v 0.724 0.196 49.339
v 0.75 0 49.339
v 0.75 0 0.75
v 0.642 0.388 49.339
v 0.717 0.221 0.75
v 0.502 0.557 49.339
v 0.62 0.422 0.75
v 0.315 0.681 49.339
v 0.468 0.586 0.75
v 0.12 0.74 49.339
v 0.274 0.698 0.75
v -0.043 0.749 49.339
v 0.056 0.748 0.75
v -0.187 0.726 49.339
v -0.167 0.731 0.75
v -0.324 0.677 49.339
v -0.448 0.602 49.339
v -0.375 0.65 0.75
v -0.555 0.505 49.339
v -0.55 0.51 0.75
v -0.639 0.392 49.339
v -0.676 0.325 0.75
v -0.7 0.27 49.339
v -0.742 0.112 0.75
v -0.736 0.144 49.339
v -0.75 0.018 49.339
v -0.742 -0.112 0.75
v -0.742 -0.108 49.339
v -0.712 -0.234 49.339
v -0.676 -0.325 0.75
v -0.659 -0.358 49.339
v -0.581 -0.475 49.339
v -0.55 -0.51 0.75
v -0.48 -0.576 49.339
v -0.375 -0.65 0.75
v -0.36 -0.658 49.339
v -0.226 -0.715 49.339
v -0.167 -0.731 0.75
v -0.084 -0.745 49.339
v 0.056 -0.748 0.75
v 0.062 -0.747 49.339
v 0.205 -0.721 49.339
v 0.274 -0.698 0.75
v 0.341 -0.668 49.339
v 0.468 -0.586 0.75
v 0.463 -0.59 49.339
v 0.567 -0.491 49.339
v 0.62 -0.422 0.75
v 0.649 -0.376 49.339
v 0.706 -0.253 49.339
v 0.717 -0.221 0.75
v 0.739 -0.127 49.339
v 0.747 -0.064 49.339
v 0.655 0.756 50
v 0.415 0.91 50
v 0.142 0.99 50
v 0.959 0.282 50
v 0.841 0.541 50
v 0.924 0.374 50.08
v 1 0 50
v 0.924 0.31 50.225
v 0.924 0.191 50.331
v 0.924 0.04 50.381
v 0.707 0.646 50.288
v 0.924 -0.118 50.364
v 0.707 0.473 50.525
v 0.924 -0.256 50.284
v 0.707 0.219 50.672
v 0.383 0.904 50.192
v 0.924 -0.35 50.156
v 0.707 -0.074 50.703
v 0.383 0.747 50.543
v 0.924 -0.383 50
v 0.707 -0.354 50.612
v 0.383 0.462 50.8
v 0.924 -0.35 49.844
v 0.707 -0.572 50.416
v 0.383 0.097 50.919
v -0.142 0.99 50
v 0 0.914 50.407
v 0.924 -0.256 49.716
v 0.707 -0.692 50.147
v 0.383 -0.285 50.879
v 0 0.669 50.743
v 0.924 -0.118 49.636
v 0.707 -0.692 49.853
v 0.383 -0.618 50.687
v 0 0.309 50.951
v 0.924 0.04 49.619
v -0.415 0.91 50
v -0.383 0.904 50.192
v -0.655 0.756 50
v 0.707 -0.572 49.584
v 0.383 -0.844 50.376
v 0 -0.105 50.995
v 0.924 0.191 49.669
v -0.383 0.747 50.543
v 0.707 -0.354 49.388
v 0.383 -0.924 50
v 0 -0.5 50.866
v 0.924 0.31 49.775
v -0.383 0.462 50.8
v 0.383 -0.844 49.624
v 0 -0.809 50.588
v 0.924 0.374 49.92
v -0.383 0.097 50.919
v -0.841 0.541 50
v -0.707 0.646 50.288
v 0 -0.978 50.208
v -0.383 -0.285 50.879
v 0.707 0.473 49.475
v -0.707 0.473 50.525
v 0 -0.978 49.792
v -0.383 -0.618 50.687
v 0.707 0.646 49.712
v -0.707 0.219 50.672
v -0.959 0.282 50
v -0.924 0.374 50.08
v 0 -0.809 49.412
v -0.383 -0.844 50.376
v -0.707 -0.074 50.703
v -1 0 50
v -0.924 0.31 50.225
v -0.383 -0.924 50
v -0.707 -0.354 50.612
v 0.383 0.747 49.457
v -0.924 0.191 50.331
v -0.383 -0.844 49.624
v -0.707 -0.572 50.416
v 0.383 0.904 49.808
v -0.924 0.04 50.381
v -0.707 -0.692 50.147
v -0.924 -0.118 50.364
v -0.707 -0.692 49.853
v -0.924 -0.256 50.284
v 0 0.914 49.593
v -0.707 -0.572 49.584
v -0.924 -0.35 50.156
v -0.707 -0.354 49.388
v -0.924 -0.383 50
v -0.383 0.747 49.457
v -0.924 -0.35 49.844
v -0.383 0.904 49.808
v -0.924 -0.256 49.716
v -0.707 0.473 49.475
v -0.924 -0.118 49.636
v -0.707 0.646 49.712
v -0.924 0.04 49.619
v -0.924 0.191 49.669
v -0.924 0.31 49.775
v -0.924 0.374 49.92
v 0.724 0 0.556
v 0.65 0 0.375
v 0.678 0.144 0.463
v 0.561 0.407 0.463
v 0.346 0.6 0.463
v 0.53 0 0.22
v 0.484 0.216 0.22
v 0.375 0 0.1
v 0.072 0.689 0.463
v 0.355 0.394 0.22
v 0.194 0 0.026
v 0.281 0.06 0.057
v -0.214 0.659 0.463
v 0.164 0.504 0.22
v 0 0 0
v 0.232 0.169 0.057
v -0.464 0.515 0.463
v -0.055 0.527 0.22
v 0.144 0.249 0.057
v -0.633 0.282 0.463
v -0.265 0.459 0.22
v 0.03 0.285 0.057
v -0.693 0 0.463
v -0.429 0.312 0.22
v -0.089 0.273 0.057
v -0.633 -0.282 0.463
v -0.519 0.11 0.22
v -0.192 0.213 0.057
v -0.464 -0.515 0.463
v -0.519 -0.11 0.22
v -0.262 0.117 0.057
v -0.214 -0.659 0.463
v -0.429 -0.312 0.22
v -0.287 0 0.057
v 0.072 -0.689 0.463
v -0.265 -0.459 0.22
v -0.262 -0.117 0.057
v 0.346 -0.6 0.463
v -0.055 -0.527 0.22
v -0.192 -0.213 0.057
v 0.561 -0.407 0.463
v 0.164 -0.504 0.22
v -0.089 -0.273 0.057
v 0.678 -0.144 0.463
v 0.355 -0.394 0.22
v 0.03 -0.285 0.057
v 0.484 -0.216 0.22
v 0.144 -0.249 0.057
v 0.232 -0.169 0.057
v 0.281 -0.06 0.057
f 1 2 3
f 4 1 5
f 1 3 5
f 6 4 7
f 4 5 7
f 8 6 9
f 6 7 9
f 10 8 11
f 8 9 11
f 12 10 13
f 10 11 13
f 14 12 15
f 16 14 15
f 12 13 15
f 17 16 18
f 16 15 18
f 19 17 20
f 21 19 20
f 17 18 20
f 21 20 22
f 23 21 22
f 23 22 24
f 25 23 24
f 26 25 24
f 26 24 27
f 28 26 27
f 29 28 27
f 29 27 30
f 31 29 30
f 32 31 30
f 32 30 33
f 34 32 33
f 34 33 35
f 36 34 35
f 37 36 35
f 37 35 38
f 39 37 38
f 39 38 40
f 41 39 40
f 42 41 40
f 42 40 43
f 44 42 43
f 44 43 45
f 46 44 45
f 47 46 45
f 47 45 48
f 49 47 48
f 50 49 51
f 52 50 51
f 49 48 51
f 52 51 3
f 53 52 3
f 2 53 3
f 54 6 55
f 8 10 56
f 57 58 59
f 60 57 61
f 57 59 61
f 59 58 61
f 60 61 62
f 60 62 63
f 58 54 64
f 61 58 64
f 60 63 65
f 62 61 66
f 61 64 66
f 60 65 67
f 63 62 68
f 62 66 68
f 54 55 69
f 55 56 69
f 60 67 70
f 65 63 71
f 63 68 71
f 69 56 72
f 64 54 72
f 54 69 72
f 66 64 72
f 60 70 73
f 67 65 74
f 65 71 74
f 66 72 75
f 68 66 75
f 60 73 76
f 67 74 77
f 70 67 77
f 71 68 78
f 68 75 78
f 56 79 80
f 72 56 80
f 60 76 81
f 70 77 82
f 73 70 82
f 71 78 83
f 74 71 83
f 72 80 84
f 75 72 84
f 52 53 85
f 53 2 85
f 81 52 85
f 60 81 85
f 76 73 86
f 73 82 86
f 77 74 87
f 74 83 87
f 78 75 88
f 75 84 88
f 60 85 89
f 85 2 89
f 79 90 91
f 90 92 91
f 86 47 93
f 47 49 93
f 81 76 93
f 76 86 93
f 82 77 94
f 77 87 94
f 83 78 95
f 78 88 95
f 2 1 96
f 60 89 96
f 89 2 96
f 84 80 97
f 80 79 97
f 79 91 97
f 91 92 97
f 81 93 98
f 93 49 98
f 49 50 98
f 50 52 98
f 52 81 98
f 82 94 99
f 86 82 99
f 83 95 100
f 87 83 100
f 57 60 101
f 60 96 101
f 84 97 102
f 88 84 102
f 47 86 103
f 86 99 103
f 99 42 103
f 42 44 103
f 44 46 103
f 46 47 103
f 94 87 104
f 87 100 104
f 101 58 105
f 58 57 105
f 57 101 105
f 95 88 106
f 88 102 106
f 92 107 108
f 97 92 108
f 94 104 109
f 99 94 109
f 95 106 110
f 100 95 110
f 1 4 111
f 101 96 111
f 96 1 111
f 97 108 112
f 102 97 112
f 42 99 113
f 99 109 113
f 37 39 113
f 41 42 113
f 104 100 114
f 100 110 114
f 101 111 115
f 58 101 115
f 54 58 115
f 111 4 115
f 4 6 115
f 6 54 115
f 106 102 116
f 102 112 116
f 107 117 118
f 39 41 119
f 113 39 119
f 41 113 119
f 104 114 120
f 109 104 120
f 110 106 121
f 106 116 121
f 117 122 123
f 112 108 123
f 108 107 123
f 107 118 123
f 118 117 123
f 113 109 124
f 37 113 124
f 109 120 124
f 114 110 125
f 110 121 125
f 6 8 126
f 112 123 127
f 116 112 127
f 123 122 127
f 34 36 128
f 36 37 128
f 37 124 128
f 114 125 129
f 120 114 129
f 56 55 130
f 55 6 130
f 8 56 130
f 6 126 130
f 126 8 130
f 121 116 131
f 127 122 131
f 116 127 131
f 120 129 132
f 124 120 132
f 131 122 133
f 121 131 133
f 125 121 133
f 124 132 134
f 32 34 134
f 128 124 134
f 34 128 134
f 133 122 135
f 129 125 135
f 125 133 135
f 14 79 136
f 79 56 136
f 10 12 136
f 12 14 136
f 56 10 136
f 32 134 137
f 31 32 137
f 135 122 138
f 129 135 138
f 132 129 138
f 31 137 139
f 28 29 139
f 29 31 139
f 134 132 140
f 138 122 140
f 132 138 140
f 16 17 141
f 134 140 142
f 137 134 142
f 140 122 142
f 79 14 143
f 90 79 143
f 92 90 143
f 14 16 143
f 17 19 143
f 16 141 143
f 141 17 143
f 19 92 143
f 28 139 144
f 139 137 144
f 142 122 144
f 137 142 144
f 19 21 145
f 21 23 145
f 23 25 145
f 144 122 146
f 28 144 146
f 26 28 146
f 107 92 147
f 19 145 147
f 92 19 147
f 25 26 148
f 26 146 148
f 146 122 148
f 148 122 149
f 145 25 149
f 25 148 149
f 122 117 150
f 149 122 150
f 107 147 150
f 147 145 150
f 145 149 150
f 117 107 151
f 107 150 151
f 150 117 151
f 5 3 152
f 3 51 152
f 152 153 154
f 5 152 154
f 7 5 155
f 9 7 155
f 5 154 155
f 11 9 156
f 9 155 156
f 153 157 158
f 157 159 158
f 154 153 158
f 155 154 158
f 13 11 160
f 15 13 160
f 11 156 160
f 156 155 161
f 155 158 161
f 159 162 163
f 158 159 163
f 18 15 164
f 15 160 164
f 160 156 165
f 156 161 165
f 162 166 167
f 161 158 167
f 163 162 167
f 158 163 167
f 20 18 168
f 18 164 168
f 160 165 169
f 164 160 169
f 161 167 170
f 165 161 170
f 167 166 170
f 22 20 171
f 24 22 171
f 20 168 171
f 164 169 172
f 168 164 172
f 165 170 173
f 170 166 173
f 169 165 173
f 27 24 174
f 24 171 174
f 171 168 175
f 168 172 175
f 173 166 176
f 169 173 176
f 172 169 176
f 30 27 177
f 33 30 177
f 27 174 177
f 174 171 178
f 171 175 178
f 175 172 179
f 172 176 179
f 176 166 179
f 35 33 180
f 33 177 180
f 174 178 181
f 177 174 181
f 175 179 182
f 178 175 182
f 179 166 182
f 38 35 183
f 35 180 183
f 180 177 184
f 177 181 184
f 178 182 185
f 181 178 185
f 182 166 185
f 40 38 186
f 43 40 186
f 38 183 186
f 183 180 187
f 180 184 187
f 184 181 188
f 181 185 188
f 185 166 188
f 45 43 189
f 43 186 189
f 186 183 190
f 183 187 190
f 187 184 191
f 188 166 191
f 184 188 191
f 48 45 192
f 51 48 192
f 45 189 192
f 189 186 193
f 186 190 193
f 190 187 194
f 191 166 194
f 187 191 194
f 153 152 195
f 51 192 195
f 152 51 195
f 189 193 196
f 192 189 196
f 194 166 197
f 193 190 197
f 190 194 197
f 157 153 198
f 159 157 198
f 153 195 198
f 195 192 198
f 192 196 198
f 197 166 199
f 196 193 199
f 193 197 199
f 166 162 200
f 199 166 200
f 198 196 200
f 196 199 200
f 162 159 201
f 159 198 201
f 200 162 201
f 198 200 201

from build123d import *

# Parameters (mm, degrees)
SKETCH1_R           = 0.75
BOSS_EXTRUDE1_DEPTH = 50
FILLET1_R           = 0.75


with BuildPart() as part:
    # Sketch1 → Boss-Extrude1 (new body)
    with BuildSketch(Plane.XY):
        Circle(SKETCH1_R)
    extrude(amount=BOSS_EXTRUDE1_DEPTH)

    # Sketch2 → Revolve1 (revolve)
    with BuildSketch(Plane.XY.offset(50)):
        with BuildLine():
            Line((-1, 0), (1, 0))
            ThreePointArc((1, 0), (0, 1), (-1, 0))
        make_face()
    revolve(axis=Axis((-1, 0, 50), (1, 0, 0)))

    # Fillet1
    fillet1_edges = [part.edges().sort_by_distance(p)[0] for p in [
        (-0.75, 0, 0),
    ]]
    fillet(fillet1_edges, radius=FILLET1_R)


solid = part.part
